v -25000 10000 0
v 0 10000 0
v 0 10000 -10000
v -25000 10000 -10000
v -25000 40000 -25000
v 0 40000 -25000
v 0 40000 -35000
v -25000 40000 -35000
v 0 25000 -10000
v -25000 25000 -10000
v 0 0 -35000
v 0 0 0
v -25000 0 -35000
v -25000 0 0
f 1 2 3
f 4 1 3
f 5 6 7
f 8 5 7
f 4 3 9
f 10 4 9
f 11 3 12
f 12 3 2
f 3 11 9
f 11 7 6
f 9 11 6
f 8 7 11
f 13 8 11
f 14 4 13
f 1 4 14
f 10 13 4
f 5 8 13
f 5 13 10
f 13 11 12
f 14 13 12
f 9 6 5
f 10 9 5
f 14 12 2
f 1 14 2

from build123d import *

# Parameters (mm, degrees)
BOSS_EXTRUDE1_DEPTH = 25000
CHAMFER2_SIZE       = 15000


with BuildPart() as part:
    # Sketch2 → Boss-Extrude1 (new body)
    with BuildSketch(Plane(origin=(0, 0, 0), x_dir=(0, 0, -1), z_dir=(1, 0, 0))):
        Polygon((0, 0), (0, 10000), (10000, 10000), (10000, 40000), (35000, 40000), (35000, 0), align=None)
    extrude(amount=-BOSS_EXTRUDE1_DEPTH)

    # Chamfer2
    chamfer2_edges = [part.edges().sort_by_distance(p)[0] for p in [
        (-12500, 40000, -10000),
    ]]
    chamfer(chamfer2_edges, length=CHAMFER2_SIZE)


solid = part.part
